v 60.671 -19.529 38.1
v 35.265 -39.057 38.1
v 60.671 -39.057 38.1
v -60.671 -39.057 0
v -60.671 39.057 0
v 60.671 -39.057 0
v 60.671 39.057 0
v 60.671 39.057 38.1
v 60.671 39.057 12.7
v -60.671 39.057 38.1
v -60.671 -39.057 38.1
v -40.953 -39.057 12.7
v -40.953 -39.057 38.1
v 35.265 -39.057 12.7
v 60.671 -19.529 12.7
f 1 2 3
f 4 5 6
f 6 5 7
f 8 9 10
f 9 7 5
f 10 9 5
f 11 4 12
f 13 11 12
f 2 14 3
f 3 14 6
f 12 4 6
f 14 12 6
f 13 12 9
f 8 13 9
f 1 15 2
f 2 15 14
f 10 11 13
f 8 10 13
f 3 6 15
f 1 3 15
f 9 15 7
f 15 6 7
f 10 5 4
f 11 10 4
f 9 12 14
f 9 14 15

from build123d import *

# Parameters (mm, degrees)
F1_DEPTH = 12.7
F2_DEPTH = 38.1
F3_DEPTH = 38.1


with BuildPart() as f1:
    # F0 (on Top) → F1 (new body)
    with BuildSketch(Plane.XY):
        Polygon((60.671091, -19.528509), (60.671091, 39.057016), (-40.952984, -39.057016), (35.265073, -39.057016), align=None)
    extrude(amount=F1_DEPTH)

    # F0 (on Top) → F2 (join)
    with BuildSketch(Plane.XY):
        Polygon((60.671091, -39.057016), (60.671091, -19.528509), (35.265073, -39.057016), align=None)
    extrude(amount=F2_DEPTH)

    # F0 (on Top) → F3 (join)
    with BuildSketch(Plane.XY):
        Polygon((-40.952984, -39.057016), (60.671091, 39.057016), (-60.671091, 39.057016), (-60.671091, -39.057016), align=None)
    extrude(amount=F3_DEPTH)


solid = f1.part
